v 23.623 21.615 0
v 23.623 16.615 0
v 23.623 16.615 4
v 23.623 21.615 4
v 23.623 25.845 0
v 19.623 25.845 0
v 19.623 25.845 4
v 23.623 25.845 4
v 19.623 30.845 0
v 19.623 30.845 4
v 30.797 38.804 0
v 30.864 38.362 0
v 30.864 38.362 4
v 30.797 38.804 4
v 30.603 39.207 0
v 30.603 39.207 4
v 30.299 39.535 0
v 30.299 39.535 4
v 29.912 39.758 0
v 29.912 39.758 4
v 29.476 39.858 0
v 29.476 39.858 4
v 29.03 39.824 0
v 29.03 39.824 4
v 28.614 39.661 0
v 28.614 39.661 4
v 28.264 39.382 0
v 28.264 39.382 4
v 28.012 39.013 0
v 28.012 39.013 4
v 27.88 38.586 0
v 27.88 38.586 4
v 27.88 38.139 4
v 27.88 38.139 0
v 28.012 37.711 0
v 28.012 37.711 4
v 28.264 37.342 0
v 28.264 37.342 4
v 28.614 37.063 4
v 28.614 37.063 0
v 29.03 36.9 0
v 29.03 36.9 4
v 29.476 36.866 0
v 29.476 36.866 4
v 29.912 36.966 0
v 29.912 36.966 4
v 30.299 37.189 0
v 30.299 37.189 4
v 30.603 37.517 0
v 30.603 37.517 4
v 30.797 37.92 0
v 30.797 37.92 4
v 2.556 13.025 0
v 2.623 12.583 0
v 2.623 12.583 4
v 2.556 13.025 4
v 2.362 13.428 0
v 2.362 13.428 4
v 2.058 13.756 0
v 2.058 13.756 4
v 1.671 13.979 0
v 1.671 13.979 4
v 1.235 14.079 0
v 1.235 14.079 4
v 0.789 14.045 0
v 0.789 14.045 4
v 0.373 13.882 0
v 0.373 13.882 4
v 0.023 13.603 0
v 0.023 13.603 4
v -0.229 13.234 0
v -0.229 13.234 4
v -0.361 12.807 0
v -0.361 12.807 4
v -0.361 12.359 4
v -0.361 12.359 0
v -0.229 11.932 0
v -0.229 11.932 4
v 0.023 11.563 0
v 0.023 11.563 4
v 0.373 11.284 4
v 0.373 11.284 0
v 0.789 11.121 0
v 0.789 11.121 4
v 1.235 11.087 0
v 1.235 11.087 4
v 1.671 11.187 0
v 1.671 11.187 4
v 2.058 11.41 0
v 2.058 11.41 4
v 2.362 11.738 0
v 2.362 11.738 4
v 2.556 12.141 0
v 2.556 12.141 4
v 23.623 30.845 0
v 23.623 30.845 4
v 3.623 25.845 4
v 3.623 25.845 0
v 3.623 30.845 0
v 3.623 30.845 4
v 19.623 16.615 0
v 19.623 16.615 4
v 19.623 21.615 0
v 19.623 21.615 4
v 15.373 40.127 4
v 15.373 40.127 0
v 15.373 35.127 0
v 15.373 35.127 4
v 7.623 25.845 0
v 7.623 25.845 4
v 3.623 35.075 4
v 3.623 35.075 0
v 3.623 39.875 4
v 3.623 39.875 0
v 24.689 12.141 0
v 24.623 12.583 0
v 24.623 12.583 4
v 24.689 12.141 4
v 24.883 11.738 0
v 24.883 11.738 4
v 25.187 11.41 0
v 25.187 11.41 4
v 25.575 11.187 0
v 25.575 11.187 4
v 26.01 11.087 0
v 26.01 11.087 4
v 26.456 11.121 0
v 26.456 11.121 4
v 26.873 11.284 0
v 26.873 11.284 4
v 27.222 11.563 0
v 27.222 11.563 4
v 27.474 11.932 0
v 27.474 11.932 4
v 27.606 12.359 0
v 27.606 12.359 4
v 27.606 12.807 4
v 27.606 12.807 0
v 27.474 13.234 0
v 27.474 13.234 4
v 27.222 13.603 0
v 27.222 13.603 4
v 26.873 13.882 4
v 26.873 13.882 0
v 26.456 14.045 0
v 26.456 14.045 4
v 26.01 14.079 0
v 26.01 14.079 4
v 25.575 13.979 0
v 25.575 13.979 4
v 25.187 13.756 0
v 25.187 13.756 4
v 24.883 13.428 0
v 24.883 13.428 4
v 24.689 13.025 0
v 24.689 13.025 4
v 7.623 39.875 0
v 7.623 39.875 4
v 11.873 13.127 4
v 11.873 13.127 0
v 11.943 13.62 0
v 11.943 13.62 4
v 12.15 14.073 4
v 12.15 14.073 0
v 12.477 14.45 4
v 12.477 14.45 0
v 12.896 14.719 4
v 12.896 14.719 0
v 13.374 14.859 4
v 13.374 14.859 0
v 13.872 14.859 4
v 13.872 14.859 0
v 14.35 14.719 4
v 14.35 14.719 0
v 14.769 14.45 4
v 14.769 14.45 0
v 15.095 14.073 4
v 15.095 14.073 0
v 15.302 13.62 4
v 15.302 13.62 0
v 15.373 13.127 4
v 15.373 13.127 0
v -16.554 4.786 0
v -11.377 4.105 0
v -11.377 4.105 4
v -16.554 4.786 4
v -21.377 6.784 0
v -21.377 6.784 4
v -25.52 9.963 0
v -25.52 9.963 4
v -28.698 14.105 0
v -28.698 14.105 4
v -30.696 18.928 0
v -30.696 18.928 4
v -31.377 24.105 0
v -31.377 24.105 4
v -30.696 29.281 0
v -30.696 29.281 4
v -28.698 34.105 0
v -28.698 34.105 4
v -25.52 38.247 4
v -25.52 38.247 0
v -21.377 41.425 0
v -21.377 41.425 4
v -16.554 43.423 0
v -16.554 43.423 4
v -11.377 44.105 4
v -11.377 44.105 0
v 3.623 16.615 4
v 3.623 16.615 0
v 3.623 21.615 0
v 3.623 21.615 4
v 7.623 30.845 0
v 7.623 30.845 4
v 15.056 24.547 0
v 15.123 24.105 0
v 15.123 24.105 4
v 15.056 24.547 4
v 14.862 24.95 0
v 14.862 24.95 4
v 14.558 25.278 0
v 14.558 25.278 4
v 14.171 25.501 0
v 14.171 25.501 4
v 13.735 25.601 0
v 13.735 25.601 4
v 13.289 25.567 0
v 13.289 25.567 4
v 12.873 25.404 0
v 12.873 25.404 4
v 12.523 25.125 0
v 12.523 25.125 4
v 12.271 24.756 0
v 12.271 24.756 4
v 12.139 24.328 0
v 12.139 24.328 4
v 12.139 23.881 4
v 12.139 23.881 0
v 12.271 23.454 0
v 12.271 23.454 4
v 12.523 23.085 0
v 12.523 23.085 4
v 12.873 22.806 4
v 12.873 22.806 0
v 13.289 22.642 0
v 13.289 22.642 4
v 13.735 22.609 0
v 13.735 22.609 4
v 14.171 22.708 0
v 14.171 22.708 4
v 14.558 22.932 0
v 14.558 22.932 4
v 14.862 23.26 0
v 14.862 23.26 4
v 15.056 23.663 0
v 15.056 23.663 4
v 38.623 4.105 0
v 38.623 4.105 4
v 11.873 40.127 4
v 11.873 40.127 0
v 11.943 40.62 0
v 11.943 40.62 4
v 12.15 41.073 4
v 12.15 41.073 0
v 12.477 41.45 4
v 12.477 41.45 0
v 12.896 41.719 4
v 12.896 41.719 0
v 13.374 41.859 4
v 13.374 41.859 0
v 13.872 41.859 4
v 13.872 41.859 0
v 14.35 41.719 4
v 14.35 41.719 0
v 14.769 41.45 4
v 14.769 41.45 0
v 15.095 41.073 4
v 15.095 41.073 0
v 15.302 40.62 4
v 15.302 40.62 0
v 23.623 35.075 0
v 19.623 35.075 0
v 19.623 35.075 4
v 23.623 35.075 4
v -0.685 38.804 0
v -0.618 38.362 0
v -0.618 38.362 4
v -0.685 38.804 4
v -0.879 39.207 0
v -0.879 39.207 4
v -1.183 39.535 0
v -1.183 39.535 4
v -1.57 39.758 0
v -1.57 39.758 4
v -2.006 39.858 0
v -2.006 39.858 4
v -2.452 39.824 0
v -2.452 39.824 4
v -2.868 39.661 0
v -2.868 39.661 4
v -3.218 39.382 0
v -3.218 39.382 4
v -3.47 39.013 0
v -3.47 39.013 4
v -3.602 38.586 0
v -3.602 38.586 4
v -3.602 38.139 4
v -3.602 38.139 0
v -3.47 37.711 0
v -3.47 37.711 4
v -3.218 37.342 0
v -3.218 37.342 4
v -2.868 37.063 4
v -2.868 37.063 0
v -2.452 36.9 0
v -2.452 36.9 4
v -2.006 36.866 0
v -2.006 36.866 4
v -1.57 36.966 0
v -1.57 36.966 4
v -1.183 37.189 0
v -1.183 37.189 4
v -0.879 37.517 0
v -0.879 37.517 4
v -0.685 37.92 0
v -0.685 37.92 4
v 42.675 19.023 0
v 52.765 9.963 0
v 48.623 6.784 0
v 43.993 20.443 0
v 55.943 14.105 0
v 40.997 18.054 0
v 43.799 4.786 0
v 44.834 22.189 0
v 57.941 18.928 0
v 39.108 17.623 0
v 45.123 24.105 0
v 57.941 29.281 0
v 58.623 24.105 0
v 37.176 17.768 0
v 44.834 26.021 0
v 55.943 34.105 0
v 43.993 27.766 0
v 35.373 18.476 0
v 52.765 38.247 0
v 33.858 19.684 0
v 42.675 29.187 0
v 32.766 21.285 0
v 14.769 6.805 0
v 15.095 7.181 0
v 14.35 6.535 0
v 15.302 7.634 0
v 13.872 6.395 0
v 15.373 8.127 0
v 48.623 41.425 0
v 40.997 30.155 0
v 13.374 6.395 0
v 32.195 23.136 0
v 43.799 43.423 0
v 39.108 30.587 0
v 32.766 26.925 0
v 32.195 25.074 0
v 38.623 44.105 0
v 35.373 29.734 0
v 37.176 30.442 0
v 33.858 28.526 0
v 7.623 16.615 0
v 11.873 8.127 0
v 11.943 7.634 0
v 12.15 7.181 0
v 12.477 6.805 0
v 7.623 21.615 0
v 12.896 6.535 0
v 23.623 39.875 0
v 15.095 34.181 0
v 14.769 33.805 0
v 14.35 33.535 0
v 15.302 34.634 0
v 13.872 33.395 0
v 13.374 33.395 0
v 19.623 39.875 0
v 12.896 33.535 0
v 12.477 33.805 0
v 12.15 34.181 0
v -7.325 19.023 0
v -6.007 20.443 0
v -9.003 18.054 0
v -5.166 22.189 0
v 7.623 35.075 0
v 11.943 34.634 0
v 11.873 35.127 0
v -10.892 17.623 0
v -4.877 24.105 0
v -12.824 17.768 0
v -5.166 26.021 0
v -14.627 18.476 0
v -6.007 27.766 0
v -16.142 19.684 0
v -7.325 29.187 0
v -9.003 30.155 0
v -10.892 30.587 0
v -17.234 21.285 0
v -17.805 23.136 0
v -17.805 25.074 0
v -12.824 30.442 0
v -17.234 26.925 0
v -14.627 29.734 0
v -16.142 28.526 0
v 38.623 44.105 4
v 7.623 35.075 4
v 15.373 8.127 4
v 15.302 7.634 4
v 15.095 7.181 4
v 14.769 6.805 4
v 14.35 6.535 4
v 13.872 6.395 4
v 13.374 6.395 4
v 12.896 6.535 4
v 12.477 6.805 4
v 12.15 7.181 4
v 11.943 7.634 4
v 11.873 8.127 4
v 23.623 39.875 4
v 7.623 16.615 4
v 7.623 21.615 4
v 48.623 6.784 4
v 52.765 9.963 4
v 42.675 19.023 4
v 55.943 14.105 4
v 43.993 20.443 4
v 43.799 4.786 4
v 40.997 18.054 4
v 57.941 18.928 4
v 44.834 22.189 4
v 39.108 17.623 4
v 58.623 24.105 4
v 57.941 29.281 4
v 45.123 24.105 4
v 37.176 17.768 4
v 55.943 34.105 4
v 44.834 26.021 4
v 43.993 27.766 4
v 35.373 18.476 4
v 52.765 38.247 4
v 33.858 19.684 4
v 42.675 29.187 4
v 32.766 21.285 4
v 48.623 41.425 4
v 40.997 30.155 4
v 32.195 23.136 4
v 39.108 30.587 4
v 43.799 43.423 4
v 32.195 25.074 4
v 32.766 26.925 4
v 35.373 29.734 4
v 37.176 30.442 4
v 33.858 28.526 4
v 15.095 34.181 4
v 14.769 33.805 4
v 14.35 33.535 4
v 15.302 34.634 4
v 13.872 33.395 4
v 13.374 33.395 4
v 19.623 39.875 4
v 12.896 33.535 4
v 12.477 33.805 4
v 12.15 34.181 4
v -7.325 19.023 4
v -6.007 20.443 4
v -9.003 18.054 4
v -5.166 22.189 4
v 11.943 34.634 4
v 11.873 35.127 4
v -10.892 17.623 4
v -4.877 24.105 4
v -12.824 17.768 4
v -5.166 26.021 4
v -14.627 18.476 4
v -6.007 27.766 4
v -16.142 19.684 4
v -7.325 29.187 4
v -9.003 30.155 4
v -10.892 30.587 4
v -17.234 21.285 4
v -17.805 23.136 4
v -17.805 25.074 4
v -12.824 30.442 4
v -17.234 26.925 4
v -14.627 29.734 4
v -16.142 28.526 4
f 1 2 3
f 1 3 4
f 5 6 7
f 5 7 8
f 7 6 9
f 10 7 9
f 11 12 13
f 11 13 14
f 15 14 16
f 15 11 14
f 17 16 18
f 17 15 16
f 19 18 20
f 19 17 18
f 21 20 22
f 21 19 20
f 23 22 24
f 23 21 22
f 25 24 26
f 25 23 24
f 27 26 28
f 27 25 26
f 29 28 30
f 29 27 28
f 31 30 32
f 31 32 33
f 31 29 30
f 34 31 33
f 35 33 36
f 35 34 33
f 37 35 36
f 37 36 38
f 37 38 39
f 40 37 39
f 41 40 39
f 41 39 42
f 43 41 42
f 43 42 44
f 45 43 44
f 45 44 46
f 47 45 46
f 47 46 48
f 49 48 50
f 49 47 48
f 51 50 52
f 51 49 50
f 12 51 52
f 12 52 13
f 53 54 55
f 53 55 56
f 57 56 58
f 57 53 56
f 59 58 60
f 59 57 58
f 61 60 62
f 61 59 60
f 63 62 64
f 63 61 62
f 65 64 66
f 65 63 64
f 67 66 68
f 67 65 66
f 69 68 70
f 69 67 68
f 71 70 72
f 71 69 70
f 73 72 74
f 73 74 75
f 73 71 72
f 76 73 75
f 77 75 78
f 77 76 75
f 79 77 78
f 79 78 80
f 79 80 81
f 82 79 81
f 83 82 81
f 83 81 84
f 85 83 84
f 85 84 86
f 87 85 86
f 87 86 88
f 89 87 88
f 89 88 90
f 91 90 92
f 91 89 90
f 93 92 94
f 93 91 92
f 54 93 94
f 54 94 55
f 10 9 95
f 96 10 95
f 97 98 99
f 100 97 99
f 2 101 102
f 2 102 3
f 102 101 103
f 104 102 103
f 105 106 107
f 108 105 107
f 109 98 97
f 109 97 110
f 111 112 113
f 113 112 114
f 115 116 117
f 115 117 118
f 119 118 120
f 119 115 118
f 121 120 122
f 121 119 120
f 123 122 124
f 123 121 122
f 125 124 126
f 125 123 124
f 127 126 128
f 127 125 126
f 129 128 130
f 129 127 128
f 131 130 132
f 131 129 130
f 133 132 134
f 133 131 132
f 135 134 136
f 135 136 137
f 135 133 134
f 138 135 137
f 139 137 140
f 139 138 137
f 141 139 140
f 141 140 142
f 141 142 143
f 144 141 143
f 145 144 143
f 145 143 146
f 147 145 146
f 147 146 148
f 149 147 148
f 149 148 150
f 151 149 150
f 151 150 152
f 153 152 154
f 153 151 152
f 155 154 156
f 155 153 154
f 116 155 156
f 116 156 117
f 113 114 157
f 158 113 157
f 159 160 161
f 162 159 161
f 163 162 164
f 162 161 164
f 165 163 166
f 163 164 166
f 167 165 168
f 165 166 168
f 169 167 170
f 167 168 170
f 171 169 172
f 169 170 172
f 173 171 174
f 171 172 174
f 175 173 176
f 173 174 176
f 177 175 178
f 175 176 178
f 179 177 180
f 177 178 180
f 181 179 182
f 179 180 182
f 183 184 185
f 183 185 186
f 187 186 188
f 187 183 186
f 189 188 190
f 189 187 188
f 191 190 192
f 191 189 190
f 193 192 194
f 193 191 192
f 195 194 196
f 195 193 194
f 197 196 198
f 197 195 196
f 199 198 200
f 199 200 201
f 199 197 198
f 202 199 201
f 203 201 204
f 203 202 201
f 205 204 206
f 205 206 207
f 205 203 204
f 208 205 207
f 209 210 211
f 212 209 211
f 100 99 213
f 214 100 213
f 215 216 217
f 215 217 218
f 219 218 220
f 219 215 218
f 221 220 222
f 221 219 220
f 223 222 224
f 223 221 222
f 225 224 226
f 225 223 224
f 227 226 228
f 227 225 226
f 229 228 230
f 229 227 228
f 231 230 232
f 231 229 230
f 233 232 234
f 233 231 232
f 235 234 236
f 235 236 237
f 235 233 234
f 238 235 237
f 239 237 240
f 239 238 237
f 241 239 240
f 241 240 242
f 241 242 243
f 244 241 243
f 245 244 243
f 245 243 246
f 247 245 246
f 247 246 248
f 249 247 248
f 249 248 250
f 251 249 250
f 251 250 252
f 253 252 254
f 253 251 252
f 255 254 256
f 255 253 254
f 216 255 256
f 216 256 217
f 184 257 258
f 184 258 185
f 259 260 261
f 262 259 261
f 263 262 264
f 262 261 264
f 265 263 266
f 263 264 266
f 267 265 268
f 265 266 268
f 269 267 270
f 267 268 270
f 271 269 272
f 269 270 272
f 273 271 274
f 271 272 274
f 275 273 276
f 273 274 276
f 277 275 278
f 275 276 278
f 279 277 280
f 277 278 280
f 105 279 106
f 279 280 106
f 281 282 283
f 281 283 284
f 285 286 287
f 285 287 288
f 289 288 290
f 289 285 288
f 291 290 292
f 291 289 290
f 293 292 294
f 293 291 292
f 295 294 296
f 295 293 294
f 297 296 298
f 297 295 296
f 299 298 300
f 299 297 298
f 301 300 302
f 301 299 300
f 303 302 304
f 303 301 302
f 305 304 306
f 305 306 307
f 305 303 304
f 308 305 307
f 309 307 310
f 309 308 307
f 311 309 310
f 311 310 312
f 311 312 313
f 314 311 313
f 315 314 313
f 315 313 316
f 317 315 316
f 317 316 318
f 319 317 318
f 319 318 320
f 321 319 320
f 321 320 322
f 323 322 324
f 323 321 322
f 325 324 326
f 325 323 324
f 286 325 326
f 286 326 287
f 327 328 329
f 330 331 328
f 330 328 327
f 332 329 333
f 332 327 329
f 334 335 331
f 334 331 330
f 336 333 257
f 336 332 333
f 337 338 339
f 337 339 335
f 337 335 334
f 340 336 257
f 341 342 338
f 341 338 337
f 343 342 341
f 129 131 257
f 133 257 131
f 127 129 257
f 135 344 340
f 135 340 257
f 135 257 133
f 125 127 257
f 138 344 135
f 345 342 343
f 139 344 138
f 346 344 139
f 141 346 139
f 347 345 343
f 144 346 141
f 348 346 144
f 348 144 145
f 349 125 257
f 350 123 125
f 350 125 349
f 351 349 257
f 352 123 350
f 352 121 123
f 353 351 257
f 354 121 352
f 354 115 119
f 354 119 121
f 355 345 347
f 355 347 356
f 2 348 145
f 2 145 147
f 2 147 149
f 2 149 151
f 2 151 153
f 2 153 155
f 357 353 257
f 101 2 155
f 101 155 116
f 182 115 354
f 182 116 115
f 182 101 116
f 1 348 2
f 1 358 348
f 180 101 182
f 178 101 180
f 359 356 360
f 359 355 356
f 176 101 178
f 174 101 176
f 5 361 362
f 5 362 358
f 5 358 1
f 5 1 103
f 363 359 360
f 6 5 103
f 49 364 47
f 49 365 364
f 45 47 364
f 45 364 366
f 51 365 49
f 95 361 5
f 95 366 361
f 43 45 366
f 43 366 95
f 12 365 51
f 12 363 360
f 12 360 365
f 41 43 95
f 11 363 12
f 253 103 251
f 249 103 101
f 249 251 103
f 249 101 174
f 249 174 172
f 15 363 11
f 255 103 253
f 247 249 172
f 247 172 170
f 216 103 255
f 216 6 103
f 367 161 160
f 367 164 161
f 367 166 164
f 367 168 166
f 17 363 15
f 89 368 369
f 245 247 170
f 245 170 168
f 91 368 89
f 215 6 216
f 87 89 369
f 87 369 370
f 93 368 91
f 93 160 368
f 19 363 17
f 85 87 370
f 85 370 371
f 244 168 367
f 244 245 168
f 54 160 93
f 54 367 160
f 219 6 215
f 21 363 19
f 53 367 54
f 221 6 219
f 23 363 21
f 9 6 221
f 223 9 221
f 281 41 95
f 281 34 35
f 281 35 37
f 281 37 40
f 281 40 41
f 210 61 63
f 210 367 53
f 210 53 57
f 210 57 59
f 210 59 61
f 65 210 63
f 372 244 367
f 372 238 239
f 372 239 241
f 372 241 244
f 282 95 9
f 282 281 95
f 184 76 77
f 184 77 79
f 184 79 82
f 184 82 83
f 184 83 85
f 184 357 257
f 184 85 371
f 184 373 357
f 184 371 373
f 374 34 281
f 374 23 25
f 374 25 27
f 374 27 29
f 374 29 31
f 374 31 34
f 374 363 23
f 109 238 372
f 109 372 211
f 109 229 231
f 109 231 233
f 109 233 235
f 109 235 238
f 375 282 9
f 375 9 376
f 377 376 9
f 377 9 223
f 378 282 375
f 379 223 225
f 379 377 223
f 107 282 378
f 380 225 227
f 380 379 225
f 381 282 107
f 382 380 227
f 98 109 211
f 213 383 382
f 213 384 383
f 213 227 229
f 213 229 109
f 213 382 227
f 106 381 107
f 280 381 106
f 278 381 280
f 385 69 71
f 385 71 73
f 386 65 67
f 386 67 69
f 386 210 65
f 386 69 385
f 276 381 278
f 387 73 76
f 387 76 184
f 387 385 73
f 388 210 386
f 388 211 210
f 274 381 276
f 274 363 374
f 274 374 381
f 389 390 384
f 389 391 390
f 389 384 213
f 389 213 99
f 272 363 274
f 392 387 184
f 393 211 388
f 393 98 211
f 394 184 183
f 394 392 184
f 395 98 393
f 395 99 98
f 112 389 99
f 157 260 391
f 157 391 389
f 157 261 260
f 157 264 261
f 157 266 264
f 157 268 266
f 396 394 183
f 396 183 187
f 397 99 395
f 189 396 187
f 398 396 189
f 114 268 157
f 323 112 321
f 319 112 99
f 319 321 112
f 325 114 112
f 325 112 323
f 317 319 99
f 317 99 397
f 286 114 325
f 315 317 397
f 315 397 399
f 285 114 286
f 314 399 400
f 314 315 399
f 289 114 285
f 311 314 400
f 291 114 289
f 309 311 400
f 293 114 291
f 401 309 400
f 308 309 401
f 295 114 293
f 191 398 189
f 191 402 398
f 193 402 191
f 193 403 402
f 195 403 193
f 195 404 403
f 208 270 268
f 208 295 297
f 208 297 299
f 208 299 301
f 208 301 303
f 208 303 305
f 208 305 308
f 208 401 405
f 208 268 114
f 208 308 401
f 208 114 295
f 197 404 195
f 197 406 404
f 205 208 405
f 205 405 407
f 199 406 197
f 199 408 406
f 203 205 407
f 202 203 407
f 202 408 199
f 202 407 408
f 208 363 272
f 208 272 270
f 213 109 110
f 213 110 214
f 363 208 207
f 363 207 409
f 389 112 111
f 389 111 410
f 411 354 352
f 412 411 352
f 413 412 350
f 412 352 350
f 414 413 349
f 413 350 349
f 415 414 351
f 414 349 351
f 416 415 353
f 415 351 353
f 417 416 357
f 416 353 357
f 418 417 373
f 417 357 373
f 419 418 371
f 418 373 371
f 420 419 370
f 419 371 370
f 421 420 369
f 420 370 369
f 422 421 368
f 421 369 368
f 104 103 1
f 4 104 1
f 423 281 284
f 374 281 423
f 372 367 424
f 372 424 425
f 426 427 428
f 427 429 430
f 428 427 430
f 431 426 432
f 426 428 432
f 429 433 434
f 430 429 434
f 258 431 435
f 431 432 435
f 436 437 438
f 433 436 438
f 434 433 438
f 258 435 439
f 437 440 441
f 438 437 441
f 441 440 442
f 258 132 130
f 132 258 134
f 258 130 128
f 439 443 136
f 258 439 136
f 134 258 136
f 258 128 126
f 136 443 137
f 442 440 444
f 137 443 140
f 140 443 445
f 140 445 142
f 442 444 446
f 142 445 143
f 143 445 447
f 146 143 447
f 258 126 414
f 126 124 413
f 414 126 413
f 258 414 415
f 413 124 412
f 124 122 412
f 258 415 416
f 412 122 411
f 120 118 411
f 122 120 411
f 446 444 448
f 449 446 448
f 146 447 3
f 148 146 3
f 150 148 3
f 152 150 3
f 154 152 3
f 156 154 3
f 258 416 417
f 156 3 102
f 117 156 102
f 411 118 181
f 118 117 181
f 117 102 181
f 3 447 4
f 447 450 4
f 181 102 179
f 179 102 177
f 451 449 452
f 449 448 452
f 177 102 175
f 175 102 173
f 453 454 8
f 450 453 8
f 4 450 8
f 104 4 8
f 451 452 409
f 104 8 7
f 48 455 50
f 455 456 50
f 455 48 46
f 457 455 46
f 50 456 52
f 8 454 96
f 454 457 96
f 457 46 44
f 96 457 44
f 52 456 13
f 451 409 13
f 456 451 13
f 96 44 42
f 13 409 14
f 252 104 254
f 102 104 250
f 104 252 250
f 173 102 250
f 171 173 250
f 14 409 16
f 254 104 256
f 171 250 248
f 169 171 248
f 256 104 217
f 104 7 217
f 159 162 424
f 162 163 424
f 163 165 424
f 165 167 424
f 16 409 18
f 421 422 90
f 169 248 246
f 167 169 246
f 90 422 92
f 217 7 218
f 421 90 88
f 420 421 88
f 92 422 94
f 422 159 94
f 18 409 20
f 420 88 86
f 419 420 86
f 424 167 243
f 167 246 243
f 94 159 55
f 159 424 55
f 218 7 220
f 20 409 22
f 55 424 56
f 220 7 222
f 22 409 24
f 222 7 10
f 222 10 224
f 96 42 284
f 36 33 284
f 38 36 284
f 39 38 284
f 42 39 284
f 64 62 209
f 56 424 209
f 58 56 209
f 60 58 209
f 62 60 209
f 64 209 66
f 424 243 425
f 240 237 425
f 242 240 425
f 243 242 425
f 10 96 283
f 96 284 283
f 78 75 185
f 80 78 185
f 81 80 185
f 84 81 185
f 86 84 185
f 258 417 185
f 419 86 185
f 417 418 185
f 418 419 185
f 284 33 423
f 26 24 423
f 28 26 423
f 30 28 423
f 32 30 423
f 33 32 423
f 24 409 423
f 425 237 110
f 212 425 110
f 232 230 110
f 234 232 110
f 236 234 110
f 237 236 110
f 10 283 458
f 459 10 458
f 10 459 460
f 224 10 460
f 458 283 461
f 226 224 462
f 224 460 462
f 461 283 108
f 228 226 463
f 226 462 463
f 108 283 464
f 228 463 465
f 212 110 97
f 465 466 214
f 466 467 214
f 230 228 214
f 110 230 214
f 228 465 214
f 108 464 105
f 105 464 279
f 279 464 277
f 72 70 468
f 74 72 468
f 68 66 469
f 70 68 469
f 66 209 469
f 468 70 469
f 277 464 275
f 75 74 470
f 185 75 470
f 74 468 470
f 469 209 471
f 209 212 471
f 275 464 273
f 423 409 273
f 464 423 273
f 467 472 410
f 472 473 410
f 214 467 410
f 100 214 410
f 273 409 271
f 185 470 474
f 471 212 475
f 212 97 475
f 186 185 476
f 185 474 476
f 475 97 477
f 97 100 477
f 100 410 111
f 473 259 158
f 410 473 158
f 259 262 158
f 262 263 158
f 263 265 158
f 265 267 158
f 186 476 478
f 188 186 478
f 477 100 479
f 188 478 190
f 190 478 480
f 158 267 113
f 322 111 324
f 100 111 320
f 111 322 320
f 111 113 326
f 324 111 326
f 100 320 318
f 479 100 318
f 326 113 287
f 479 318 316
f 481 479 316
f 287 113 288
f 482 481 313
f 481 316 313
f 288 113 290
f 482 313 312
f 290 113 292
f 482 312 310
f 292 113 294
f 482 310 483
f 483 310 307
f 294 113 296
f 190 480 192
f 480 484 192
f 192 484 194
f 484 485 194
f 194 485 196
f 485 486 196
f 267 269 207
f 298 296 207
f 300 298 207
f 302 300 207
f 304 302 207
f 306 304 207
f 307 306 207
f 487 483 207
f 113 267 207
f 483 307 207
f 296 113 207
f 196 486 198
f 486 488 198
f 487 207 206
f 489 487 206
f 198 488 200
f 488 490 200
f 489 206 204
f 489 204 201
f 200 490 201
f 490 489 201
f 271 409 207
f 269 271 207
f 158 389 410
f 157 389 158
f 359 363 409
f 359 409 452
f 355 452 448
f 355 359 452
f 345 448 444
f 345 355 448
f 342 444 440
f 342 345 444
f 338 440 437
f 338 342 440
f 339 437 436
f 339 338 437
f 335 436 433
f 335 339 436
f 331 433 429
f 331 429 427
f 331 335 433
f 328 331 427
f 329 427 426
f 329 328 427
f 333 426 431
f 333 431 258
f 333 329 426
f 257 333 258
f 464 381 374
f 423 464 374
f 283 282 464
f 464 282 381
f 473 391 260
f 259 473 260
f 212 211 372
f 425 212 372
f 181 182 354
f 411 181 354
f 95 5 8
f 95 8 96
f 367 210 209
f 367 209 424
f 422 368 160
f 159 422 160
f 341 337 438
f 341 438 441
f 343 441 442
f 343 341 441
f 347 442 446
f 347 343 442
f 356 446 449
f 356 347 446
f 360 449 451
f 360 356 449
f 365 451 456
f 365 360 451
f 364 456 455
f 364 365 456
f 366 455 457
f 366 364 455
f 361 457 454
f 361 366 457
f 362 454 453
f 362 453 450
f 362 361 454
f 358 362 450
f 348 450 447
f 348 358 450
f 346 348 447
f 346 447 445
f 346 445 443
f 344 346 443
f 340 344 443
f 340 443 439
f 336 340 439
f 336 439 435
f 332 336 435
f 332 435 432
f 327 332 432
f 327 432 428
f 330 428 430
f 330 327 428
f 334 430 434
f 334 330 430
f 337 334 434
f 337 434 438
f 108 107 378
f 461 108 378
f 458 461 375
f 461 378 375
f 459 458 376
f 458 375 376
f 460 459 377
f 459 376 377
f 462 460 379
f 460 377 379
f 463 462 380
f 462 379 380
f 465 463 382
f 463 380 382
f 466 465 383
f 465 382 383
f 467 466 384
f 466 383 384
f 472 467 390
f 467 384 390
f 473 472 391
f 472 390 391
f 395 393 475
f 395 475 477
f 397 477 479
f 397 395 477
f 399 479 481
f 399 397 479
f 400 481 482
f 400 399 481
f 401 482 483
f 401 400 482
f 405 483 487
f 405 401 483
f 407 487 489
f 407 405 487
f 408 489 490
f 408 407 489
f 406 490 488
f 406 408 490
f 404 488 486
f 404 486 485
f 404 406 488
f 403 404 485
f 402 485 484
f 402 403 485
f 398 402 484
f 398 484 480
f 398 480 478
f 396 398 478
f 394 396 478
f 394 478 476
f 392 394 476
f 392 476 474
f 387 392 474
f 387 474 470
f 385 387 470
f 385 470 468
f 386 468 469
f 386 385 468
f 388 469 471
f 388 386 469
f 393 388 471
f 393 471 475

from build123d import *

# Parameters (mm, degrees)
SKETCH_1_R      = 1.5
SKETCH_1_R_2    = 6.5
SKETCH_1_W      = 4
SKETCH_1_H      = 4.8
SKETCH_1_H_2    = 5
EXTRUDE_1_DEPTH = 4


with BuildPart() as part:
    # 草图1 → 凸台-拉伸1 (new body)
    with BuildSketch(Plane.XY):
        with BuildLine():
            Line((-11.37741807, 44.104762576), (9.62258193, 44.104762576))
            Line((9.62258193, 44.104762576), (17.62258193, 44.104762576))
            Line((17.62258193, 44.104762576), (38.62258193, 44.104762576))
            ThreePointArc((38.62258193, 44.104762576), (58.62258193, 24.104762576), (38.62258193, 4.104762576))
            Line((38.62258193, 4.104762576), (-11.37741807, 4.104762576))
            ThreePointArc((-11.37741807, 4.104762576), (-31.37741807, 24.104762576), (-11.37741807, 44.104762576))
        make_face()
        with Locations((1.12258193, 12.583043954)):
            Circle(SKETCH_1_R, mode=Mode.SUBTRACT)
        with Locations(Location((26.12258193, 12.583043954, 0), (0, 0, 180))):
            Circle(SKETCH_1_R, mode=Mode.SUBTRACT)
        with Locations((13.62258193, 24.104762576)):
            Circle(SKETCH_1_R, mode=Mode.SUBTRACT)
        with Locations((-11.37741807, 24.104762576)):
            Circle(SKETCH_1_R_2, mode=Mode.SUBTRACT)
        with Locations((38.62258193, 24.104762576)):
            Circle(SKETCH_1_R_2, mode=Mode.SUBTRACT)
        with Locations((29.363598717, 38.36208455)):
            Circle(SKETCH_1_R, mode=Mode.SUBTRACT)
        with Locations((-2.118434858, 38.36208455)):
            Circle(SKETCH_1_R, mode=Mode.SUBTRACT)
        with Locations((21.62258193, 37.474762576)):
            Rectangle(SKETCH_1_W, SKETCH_1_H, mode=Mode.SUBTRACT)
        with Locations((21.62258193, 28.344762576)):
            Rectangle(SKETCH_1_W, SKETCH_1_H_2, mode=Mode.SUBTRACT)
        with Locations((5.62258193, 37.474762576)):
            Rectangle(SKETCH_1_W, SKETCH_1_H, mode=Mode.SUBTRACT)
        with Locations((5.62258193, 28.344762576)):
            Rectangle(SKETCH_1_W, SKETCH_1_H_2, mode=Mode.SUBTRACT)
        with Locations((5.62258193, 19.114762576)):
            Rectangle(SKETCH_1_W, SKETCH_1_H_2, mode=Mode.SUBTRACT)
        with Locations((21.62258193, 19.114762576)):
            Rectangle(SKETCH_1_W, SKETCH_1_H_2, mode=Mode.SUBTRACT)
        with BuildLine():
            Line((11.87258193, 8.127075217), (11.87258193, 13.127075217))
            ThreePointArc((11.87258193, 13.127075217), (13.62258193, 14.877075217), (15.37258193, 13.127075217))
            Line((15.37258193, 13.127075217), (15.37258193, 8.127075217))
            ThreePointArc((15.37258193, 8.127075217), (13.62258193, 6.377075217), (11.87258193, 8.127075217))
        make_face(mode=Mode.SUBTRACT)
        with BuildLine():
            Line((15.37258193, 40.127075217), (15.37258193, 35.127075217))
            ThreePointArc((15.37258193, 35.127075217), (13.62258193, 33.377075217), (11.87258193, 35.127075217))
            Line((11.87258193, 35.127075217), (11.87258193, 40.127075217))
            ThreePointArc((11.87258193, 40.127075217), (13.62258193, 41.877075217), (15.37258193, 40.127075217))
        make_face(mode=Mode.SUBTRACT)
    extrude(amount=EXTRUDE_1_DEPTH)


solid = part.part
